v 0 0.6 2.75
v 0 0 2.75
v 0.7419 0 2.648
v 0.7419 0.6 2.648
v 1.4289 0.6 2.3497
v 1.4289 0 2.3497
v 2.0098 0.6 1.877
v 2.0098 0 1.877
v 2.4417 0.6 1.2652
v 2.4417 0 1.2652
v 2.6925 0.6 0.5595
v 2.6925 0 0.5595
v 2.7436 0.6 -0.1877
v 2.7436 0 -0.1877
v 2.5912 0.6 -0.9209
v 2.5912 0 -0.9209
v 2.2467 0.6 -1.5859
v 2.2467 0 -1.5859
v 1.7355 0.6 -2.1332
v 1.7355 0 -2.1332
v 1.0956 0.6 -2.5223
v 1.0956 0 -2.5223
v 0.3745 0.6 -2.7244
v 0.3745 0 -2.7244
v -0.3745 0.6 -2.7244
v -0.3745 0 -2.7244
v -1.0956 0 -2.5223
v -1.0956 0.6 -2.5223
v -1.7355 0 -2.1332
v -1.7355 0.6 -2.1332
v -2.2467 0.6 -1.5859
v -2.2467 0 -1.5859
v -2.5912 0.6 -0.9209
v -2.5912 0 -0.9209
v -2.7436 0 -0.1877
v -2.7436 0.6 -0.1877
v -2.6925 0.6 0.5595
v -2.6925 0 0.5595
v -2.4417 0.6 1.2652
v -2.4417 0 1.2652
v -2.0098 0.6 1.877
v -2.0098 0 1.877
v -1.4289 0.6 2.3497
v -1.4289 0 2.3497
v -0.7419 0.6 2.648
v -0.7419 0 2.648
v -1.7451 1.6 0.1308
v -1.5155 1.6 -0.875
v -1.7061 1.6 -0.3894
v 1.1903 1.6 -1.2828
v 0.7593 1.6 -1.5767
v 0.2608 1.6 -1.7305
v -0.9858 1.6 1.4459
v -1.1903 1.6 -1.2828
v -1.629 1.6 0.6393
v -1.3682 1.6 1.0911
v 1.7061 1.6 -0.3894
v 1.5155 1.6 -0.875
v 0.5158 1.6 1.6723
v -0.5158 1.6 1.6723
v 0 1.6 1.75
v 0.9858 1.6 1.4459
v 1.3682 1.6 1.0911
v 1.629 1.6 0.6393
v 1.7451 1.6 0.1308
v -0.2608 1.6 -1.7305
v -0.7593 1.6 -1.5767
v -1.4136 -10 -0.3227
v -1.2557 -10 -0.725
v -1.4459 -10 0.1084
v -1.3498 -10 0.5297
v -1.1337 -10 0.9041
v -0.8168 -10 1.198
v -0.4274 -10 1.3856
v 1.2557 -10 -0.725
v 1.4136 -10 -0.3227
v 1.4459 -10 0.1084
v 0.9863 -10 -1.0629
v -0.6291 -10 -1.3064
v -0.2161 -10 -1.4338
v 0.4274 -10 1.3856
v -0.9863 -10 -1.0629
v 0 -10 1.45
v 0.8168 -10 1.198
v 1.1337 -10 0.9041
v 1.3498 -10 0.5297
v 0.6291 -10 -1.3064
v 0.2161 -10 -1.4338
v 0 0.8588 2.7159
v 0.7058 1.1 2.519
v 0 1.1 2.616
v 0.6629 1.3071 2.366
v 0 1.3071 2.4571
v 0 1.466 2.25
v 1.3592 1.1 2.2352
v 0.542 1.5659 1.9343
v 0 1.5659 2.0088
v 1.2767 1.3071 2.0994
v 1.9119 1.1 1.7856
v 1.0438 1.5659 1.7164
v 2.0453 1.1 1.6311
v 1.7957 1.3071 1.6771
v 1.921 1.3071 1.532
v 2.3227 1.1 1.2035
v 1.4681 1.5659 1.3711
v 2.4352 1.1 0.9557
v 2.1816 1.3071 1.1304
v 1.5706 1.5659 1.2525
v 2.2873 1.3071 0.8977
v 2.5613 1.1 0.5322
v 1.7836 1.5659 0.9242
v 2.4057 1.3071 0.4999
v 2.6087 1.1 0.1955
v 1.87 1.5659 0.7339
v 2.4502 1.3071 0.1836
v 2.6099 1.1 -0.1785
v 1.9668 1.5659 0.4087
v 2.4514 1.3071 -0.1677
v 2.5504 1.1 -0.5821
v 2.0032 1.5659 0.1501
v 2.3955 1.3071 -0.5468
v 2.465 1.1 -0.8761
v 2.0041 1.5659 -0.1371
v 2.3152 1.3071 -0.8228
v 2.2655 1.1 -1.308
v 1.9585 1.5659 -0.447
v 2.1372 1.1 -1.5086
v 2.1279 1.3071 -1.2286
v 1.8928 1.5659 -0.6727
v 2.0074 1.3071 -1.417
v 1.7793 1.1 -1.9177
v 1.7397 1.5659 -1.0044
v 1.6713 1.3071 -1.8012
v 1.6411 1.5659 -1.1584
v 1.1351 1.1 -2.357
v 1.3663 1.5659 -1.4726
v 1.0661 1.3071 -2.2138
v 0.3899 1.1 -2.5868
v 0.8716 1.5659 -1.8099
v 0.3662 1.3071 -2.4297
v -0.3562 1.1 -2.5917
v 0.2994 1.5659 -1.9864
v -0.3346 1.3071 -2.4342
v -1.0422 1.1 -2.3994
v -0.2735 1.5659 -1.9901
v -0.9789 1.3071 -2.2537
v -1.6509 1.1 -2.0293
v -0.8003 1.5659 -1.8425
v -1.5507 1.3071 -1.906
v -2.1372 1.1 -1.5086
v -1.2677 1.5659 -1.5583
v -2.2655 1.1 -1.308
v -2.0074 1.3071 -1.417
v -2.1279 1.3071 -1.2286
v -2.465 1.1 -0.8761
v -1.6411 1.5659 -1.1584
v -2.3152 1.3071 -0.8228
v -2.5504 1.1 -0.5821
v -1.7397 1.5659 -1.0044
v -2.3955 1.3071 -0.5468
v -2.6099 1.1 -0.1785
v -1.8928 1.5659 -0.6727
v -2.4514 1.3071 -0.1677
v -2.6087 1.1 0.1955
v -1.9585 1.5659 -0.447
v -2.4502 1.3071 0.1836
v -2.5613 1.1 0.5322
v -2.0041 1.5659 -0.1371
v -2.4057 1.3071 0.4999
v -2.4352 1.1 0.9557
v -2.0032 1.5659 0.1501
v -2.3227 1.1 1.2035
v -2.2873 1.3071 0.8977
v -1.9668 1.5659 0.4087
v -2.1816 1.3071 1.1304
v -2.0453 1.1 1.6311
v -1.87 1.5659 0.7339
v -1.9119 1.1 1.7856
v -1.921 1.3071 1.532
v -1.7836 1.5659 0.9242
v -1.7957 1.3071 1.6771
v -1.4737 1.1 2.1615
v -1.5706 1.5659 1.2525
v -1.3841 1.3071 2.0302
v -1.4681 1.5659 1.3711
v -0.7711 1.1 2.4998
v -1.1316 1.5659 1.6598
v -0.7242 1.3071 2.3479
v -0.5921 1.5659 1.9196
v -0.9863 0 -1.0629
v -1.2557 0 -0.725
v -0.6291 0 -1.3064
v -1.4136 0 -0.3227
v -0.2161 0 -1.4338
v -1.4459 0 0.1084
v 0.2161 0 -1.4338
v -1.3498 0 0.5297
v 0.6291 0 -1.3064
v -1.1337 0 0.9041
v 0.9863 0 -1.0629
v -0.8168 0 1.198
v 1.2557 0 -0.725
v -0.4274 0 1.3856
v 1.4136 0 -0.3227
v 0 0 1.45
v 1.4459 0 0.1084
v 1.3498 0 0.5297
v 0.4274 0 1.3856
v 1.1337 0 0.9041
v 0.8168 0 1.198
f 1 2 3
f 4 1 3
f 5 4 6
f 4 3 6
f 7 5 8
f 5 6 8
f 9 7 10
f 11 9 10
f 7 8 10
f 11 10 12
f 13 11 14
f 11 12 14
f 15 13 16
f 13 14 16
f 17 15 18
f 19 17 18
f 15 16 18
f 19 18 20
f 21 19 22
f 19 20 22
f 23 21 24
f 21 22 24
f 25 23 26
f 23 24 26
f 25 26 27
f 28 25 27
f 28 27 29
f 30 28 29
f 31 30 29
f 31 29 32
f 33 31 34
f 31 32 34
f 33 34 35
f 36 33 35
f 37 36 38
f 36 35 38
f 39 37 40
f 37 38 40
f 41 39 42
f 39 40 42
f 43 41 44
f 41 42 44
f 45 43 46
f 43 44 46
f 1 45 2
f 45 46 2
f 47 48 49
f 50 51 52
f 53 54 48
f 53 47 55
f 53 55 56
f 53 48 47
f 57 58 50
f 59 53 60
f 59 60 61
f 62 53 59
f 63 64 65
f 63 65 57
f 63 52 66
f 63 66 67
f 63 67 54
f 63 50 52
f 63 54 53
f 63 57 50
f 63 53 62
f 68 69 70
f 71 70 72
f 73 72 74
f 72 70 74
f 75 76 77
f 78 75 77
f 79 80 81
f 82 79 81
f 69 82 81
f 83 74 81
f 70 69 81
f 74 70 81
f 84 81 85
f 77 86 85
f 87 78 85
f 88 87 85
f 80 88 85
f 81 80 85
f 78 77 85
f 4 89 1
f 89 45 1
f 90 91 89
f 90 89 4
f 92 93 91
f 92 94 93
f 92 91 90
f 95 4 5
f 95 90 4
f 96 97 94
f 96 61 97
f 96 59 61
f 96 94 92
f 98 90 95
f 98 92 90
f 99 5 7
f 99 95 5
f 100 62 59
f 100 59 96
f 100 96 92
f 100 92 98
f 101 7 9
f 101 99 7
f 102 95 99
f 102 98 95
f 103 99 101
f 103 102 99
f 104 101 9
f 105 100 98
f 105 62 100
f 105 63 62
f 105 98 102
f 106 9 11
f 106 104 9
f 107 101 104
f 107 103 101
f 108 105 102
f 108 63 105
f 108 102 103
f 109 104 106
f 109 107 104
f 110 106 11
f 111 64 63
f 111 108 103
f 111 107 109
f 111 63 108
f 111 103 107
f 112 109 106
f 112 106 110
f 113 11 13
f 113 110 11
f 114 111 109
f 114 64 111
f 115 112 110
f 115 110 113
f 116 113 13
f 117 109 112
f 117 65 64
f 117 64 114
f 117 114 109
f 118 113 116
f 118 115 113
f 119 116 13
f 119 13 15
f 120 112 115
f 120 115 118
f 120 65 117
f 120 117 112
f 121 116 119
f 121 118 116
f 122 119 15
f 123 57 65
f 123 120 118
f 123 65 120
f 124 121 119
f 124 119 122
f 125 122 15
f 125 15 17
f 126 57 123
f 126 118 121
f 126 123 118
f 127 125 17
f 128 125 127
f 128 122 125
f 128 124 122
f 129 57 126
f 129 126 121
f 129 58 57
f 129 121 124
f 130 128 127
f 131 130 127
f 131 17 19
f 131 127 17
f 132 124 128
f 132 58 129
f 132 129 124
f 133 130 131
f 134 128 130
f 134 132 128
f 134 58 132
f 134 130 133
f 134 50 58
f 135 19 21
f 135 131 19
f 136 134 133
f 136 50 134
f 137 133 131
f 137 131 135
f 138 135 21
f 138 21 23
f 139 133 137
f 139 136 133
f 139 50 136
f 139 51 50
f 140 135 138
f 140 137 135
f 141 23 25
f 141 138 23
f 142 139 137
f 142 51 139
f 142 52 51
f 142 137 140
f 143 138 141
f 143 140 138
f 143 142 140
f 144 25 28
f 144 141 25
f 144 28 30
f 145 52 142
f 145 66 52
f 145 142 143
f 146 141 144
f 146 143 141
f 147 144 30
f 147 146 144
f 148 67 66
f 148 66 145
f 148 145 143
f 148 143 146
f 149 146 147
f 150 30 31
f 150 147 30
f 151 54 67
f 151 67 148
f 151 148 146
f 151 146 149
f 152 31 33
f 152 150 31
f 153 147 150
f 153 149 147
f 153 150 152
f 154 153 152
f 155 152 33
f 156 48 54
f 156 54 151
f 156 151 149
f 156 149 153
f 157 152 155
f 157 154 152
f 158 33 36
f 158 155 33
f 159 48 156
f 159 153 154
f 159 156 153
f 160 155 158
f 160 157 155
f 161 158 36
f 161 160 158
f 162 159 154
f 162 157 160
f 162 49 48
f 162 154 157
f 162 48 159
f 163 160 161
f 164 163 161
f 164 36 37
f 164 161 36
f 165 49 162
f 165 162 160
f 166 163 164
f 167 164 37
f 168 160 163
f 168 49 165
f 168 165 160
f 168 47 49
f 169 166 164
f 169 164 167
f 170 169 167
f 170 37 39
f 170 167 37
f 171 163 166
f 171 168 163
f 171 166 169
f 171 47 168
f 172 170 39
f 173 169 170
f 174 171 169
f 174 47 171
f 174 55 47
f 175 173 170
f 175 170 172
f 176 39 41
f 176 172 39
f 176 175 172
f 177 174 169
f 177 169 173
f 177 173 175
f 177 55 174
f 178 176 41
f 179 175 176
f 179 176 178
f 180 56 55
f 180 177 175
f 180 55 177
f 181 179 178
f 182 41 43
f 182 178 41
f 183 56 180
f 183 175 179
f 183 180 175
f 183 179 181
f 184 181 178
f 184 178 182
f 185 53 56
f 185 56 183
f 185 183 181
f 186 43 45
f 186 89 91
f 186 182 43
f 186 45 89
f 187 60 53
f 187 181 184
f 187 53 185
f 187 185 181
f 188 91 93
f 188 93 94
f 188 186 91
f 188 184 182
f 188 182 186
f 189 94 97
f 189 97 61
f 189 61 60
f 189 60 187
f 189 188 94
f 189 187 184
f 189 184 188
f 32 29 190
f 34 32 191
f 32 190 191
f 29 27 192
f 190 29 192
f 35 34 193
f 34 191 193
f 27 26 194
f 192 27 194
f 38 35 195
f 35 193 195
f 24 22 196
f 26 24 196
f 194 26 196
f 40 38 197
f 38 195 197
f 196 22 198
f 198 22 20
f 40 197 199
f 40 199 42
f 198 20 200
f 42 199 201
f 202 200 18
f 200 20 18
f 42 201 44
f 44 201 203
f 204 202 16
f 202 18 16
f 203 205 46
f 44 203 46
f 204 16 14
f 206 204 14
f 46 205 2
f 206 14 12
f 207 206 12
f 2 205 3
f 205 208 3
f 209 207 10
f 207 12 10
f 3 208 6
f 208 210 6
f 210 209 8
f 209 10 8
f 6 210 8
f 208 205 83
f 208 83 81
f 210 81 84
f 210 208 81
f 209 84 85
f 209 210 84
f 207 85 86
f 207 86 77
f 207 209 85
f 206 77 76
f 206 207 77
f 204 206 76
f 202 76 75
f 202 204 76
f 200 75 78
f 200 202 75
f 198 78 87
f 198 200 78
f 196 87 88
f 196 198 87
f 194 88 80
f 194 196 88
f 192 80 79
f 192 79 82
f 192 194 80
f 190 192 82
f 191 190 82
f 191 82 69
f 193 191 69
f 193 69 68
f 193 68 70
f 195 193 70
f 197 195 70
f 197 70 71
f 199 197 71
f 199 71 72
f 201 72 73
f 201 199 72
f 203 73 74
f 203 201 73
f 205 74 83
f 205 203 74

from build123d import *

# Parameters (mm, degrees)
SKETCH1_R           = 1.45
BOSS_EXTRUDE1_DEPTH = 10
SKETCH2_R           = 2.75
BOSS_EXTRUDE2_DEPTH = 1.6
FILLET1_R           = 1


with BuildPart() as part:
    # Sketch1 → Boss-Extrude1 (new body)
    with BuildSketch(Plane(origin=(0, 0, 0), x_dir=(1, 0, 0), z_dir=(0, 1, 0))):
        with Locations(Location((0, 0, 0), (0, 0, 270))):
            Circle(SKETCH1_R)
    extrude(amount=-BOSS_EXTRUDE1_DEPTH)

    # Sketch2 → Boss-Extrude2 (add)
    with BuildSketch(Plane(origin=(0, 0, 0), x_dir=(1, 0, 0), z_dir=(0, 1, 0))):
        with Locations(Location((0, 0, 0), (0, 0, 270))):
            Circle(SKETCH2_R)
    extrude(amount=BOSS_EXTRUDE2_DEPTH)

    # Fillet1
    fillet1_edges = [part.edges().sort_by_distance(p)[0] for p in [
        (0, 1.6, -2.75),
    ]]
    fillet(fillet1_edges, radius=FILLET1_R)


solid = part.part
